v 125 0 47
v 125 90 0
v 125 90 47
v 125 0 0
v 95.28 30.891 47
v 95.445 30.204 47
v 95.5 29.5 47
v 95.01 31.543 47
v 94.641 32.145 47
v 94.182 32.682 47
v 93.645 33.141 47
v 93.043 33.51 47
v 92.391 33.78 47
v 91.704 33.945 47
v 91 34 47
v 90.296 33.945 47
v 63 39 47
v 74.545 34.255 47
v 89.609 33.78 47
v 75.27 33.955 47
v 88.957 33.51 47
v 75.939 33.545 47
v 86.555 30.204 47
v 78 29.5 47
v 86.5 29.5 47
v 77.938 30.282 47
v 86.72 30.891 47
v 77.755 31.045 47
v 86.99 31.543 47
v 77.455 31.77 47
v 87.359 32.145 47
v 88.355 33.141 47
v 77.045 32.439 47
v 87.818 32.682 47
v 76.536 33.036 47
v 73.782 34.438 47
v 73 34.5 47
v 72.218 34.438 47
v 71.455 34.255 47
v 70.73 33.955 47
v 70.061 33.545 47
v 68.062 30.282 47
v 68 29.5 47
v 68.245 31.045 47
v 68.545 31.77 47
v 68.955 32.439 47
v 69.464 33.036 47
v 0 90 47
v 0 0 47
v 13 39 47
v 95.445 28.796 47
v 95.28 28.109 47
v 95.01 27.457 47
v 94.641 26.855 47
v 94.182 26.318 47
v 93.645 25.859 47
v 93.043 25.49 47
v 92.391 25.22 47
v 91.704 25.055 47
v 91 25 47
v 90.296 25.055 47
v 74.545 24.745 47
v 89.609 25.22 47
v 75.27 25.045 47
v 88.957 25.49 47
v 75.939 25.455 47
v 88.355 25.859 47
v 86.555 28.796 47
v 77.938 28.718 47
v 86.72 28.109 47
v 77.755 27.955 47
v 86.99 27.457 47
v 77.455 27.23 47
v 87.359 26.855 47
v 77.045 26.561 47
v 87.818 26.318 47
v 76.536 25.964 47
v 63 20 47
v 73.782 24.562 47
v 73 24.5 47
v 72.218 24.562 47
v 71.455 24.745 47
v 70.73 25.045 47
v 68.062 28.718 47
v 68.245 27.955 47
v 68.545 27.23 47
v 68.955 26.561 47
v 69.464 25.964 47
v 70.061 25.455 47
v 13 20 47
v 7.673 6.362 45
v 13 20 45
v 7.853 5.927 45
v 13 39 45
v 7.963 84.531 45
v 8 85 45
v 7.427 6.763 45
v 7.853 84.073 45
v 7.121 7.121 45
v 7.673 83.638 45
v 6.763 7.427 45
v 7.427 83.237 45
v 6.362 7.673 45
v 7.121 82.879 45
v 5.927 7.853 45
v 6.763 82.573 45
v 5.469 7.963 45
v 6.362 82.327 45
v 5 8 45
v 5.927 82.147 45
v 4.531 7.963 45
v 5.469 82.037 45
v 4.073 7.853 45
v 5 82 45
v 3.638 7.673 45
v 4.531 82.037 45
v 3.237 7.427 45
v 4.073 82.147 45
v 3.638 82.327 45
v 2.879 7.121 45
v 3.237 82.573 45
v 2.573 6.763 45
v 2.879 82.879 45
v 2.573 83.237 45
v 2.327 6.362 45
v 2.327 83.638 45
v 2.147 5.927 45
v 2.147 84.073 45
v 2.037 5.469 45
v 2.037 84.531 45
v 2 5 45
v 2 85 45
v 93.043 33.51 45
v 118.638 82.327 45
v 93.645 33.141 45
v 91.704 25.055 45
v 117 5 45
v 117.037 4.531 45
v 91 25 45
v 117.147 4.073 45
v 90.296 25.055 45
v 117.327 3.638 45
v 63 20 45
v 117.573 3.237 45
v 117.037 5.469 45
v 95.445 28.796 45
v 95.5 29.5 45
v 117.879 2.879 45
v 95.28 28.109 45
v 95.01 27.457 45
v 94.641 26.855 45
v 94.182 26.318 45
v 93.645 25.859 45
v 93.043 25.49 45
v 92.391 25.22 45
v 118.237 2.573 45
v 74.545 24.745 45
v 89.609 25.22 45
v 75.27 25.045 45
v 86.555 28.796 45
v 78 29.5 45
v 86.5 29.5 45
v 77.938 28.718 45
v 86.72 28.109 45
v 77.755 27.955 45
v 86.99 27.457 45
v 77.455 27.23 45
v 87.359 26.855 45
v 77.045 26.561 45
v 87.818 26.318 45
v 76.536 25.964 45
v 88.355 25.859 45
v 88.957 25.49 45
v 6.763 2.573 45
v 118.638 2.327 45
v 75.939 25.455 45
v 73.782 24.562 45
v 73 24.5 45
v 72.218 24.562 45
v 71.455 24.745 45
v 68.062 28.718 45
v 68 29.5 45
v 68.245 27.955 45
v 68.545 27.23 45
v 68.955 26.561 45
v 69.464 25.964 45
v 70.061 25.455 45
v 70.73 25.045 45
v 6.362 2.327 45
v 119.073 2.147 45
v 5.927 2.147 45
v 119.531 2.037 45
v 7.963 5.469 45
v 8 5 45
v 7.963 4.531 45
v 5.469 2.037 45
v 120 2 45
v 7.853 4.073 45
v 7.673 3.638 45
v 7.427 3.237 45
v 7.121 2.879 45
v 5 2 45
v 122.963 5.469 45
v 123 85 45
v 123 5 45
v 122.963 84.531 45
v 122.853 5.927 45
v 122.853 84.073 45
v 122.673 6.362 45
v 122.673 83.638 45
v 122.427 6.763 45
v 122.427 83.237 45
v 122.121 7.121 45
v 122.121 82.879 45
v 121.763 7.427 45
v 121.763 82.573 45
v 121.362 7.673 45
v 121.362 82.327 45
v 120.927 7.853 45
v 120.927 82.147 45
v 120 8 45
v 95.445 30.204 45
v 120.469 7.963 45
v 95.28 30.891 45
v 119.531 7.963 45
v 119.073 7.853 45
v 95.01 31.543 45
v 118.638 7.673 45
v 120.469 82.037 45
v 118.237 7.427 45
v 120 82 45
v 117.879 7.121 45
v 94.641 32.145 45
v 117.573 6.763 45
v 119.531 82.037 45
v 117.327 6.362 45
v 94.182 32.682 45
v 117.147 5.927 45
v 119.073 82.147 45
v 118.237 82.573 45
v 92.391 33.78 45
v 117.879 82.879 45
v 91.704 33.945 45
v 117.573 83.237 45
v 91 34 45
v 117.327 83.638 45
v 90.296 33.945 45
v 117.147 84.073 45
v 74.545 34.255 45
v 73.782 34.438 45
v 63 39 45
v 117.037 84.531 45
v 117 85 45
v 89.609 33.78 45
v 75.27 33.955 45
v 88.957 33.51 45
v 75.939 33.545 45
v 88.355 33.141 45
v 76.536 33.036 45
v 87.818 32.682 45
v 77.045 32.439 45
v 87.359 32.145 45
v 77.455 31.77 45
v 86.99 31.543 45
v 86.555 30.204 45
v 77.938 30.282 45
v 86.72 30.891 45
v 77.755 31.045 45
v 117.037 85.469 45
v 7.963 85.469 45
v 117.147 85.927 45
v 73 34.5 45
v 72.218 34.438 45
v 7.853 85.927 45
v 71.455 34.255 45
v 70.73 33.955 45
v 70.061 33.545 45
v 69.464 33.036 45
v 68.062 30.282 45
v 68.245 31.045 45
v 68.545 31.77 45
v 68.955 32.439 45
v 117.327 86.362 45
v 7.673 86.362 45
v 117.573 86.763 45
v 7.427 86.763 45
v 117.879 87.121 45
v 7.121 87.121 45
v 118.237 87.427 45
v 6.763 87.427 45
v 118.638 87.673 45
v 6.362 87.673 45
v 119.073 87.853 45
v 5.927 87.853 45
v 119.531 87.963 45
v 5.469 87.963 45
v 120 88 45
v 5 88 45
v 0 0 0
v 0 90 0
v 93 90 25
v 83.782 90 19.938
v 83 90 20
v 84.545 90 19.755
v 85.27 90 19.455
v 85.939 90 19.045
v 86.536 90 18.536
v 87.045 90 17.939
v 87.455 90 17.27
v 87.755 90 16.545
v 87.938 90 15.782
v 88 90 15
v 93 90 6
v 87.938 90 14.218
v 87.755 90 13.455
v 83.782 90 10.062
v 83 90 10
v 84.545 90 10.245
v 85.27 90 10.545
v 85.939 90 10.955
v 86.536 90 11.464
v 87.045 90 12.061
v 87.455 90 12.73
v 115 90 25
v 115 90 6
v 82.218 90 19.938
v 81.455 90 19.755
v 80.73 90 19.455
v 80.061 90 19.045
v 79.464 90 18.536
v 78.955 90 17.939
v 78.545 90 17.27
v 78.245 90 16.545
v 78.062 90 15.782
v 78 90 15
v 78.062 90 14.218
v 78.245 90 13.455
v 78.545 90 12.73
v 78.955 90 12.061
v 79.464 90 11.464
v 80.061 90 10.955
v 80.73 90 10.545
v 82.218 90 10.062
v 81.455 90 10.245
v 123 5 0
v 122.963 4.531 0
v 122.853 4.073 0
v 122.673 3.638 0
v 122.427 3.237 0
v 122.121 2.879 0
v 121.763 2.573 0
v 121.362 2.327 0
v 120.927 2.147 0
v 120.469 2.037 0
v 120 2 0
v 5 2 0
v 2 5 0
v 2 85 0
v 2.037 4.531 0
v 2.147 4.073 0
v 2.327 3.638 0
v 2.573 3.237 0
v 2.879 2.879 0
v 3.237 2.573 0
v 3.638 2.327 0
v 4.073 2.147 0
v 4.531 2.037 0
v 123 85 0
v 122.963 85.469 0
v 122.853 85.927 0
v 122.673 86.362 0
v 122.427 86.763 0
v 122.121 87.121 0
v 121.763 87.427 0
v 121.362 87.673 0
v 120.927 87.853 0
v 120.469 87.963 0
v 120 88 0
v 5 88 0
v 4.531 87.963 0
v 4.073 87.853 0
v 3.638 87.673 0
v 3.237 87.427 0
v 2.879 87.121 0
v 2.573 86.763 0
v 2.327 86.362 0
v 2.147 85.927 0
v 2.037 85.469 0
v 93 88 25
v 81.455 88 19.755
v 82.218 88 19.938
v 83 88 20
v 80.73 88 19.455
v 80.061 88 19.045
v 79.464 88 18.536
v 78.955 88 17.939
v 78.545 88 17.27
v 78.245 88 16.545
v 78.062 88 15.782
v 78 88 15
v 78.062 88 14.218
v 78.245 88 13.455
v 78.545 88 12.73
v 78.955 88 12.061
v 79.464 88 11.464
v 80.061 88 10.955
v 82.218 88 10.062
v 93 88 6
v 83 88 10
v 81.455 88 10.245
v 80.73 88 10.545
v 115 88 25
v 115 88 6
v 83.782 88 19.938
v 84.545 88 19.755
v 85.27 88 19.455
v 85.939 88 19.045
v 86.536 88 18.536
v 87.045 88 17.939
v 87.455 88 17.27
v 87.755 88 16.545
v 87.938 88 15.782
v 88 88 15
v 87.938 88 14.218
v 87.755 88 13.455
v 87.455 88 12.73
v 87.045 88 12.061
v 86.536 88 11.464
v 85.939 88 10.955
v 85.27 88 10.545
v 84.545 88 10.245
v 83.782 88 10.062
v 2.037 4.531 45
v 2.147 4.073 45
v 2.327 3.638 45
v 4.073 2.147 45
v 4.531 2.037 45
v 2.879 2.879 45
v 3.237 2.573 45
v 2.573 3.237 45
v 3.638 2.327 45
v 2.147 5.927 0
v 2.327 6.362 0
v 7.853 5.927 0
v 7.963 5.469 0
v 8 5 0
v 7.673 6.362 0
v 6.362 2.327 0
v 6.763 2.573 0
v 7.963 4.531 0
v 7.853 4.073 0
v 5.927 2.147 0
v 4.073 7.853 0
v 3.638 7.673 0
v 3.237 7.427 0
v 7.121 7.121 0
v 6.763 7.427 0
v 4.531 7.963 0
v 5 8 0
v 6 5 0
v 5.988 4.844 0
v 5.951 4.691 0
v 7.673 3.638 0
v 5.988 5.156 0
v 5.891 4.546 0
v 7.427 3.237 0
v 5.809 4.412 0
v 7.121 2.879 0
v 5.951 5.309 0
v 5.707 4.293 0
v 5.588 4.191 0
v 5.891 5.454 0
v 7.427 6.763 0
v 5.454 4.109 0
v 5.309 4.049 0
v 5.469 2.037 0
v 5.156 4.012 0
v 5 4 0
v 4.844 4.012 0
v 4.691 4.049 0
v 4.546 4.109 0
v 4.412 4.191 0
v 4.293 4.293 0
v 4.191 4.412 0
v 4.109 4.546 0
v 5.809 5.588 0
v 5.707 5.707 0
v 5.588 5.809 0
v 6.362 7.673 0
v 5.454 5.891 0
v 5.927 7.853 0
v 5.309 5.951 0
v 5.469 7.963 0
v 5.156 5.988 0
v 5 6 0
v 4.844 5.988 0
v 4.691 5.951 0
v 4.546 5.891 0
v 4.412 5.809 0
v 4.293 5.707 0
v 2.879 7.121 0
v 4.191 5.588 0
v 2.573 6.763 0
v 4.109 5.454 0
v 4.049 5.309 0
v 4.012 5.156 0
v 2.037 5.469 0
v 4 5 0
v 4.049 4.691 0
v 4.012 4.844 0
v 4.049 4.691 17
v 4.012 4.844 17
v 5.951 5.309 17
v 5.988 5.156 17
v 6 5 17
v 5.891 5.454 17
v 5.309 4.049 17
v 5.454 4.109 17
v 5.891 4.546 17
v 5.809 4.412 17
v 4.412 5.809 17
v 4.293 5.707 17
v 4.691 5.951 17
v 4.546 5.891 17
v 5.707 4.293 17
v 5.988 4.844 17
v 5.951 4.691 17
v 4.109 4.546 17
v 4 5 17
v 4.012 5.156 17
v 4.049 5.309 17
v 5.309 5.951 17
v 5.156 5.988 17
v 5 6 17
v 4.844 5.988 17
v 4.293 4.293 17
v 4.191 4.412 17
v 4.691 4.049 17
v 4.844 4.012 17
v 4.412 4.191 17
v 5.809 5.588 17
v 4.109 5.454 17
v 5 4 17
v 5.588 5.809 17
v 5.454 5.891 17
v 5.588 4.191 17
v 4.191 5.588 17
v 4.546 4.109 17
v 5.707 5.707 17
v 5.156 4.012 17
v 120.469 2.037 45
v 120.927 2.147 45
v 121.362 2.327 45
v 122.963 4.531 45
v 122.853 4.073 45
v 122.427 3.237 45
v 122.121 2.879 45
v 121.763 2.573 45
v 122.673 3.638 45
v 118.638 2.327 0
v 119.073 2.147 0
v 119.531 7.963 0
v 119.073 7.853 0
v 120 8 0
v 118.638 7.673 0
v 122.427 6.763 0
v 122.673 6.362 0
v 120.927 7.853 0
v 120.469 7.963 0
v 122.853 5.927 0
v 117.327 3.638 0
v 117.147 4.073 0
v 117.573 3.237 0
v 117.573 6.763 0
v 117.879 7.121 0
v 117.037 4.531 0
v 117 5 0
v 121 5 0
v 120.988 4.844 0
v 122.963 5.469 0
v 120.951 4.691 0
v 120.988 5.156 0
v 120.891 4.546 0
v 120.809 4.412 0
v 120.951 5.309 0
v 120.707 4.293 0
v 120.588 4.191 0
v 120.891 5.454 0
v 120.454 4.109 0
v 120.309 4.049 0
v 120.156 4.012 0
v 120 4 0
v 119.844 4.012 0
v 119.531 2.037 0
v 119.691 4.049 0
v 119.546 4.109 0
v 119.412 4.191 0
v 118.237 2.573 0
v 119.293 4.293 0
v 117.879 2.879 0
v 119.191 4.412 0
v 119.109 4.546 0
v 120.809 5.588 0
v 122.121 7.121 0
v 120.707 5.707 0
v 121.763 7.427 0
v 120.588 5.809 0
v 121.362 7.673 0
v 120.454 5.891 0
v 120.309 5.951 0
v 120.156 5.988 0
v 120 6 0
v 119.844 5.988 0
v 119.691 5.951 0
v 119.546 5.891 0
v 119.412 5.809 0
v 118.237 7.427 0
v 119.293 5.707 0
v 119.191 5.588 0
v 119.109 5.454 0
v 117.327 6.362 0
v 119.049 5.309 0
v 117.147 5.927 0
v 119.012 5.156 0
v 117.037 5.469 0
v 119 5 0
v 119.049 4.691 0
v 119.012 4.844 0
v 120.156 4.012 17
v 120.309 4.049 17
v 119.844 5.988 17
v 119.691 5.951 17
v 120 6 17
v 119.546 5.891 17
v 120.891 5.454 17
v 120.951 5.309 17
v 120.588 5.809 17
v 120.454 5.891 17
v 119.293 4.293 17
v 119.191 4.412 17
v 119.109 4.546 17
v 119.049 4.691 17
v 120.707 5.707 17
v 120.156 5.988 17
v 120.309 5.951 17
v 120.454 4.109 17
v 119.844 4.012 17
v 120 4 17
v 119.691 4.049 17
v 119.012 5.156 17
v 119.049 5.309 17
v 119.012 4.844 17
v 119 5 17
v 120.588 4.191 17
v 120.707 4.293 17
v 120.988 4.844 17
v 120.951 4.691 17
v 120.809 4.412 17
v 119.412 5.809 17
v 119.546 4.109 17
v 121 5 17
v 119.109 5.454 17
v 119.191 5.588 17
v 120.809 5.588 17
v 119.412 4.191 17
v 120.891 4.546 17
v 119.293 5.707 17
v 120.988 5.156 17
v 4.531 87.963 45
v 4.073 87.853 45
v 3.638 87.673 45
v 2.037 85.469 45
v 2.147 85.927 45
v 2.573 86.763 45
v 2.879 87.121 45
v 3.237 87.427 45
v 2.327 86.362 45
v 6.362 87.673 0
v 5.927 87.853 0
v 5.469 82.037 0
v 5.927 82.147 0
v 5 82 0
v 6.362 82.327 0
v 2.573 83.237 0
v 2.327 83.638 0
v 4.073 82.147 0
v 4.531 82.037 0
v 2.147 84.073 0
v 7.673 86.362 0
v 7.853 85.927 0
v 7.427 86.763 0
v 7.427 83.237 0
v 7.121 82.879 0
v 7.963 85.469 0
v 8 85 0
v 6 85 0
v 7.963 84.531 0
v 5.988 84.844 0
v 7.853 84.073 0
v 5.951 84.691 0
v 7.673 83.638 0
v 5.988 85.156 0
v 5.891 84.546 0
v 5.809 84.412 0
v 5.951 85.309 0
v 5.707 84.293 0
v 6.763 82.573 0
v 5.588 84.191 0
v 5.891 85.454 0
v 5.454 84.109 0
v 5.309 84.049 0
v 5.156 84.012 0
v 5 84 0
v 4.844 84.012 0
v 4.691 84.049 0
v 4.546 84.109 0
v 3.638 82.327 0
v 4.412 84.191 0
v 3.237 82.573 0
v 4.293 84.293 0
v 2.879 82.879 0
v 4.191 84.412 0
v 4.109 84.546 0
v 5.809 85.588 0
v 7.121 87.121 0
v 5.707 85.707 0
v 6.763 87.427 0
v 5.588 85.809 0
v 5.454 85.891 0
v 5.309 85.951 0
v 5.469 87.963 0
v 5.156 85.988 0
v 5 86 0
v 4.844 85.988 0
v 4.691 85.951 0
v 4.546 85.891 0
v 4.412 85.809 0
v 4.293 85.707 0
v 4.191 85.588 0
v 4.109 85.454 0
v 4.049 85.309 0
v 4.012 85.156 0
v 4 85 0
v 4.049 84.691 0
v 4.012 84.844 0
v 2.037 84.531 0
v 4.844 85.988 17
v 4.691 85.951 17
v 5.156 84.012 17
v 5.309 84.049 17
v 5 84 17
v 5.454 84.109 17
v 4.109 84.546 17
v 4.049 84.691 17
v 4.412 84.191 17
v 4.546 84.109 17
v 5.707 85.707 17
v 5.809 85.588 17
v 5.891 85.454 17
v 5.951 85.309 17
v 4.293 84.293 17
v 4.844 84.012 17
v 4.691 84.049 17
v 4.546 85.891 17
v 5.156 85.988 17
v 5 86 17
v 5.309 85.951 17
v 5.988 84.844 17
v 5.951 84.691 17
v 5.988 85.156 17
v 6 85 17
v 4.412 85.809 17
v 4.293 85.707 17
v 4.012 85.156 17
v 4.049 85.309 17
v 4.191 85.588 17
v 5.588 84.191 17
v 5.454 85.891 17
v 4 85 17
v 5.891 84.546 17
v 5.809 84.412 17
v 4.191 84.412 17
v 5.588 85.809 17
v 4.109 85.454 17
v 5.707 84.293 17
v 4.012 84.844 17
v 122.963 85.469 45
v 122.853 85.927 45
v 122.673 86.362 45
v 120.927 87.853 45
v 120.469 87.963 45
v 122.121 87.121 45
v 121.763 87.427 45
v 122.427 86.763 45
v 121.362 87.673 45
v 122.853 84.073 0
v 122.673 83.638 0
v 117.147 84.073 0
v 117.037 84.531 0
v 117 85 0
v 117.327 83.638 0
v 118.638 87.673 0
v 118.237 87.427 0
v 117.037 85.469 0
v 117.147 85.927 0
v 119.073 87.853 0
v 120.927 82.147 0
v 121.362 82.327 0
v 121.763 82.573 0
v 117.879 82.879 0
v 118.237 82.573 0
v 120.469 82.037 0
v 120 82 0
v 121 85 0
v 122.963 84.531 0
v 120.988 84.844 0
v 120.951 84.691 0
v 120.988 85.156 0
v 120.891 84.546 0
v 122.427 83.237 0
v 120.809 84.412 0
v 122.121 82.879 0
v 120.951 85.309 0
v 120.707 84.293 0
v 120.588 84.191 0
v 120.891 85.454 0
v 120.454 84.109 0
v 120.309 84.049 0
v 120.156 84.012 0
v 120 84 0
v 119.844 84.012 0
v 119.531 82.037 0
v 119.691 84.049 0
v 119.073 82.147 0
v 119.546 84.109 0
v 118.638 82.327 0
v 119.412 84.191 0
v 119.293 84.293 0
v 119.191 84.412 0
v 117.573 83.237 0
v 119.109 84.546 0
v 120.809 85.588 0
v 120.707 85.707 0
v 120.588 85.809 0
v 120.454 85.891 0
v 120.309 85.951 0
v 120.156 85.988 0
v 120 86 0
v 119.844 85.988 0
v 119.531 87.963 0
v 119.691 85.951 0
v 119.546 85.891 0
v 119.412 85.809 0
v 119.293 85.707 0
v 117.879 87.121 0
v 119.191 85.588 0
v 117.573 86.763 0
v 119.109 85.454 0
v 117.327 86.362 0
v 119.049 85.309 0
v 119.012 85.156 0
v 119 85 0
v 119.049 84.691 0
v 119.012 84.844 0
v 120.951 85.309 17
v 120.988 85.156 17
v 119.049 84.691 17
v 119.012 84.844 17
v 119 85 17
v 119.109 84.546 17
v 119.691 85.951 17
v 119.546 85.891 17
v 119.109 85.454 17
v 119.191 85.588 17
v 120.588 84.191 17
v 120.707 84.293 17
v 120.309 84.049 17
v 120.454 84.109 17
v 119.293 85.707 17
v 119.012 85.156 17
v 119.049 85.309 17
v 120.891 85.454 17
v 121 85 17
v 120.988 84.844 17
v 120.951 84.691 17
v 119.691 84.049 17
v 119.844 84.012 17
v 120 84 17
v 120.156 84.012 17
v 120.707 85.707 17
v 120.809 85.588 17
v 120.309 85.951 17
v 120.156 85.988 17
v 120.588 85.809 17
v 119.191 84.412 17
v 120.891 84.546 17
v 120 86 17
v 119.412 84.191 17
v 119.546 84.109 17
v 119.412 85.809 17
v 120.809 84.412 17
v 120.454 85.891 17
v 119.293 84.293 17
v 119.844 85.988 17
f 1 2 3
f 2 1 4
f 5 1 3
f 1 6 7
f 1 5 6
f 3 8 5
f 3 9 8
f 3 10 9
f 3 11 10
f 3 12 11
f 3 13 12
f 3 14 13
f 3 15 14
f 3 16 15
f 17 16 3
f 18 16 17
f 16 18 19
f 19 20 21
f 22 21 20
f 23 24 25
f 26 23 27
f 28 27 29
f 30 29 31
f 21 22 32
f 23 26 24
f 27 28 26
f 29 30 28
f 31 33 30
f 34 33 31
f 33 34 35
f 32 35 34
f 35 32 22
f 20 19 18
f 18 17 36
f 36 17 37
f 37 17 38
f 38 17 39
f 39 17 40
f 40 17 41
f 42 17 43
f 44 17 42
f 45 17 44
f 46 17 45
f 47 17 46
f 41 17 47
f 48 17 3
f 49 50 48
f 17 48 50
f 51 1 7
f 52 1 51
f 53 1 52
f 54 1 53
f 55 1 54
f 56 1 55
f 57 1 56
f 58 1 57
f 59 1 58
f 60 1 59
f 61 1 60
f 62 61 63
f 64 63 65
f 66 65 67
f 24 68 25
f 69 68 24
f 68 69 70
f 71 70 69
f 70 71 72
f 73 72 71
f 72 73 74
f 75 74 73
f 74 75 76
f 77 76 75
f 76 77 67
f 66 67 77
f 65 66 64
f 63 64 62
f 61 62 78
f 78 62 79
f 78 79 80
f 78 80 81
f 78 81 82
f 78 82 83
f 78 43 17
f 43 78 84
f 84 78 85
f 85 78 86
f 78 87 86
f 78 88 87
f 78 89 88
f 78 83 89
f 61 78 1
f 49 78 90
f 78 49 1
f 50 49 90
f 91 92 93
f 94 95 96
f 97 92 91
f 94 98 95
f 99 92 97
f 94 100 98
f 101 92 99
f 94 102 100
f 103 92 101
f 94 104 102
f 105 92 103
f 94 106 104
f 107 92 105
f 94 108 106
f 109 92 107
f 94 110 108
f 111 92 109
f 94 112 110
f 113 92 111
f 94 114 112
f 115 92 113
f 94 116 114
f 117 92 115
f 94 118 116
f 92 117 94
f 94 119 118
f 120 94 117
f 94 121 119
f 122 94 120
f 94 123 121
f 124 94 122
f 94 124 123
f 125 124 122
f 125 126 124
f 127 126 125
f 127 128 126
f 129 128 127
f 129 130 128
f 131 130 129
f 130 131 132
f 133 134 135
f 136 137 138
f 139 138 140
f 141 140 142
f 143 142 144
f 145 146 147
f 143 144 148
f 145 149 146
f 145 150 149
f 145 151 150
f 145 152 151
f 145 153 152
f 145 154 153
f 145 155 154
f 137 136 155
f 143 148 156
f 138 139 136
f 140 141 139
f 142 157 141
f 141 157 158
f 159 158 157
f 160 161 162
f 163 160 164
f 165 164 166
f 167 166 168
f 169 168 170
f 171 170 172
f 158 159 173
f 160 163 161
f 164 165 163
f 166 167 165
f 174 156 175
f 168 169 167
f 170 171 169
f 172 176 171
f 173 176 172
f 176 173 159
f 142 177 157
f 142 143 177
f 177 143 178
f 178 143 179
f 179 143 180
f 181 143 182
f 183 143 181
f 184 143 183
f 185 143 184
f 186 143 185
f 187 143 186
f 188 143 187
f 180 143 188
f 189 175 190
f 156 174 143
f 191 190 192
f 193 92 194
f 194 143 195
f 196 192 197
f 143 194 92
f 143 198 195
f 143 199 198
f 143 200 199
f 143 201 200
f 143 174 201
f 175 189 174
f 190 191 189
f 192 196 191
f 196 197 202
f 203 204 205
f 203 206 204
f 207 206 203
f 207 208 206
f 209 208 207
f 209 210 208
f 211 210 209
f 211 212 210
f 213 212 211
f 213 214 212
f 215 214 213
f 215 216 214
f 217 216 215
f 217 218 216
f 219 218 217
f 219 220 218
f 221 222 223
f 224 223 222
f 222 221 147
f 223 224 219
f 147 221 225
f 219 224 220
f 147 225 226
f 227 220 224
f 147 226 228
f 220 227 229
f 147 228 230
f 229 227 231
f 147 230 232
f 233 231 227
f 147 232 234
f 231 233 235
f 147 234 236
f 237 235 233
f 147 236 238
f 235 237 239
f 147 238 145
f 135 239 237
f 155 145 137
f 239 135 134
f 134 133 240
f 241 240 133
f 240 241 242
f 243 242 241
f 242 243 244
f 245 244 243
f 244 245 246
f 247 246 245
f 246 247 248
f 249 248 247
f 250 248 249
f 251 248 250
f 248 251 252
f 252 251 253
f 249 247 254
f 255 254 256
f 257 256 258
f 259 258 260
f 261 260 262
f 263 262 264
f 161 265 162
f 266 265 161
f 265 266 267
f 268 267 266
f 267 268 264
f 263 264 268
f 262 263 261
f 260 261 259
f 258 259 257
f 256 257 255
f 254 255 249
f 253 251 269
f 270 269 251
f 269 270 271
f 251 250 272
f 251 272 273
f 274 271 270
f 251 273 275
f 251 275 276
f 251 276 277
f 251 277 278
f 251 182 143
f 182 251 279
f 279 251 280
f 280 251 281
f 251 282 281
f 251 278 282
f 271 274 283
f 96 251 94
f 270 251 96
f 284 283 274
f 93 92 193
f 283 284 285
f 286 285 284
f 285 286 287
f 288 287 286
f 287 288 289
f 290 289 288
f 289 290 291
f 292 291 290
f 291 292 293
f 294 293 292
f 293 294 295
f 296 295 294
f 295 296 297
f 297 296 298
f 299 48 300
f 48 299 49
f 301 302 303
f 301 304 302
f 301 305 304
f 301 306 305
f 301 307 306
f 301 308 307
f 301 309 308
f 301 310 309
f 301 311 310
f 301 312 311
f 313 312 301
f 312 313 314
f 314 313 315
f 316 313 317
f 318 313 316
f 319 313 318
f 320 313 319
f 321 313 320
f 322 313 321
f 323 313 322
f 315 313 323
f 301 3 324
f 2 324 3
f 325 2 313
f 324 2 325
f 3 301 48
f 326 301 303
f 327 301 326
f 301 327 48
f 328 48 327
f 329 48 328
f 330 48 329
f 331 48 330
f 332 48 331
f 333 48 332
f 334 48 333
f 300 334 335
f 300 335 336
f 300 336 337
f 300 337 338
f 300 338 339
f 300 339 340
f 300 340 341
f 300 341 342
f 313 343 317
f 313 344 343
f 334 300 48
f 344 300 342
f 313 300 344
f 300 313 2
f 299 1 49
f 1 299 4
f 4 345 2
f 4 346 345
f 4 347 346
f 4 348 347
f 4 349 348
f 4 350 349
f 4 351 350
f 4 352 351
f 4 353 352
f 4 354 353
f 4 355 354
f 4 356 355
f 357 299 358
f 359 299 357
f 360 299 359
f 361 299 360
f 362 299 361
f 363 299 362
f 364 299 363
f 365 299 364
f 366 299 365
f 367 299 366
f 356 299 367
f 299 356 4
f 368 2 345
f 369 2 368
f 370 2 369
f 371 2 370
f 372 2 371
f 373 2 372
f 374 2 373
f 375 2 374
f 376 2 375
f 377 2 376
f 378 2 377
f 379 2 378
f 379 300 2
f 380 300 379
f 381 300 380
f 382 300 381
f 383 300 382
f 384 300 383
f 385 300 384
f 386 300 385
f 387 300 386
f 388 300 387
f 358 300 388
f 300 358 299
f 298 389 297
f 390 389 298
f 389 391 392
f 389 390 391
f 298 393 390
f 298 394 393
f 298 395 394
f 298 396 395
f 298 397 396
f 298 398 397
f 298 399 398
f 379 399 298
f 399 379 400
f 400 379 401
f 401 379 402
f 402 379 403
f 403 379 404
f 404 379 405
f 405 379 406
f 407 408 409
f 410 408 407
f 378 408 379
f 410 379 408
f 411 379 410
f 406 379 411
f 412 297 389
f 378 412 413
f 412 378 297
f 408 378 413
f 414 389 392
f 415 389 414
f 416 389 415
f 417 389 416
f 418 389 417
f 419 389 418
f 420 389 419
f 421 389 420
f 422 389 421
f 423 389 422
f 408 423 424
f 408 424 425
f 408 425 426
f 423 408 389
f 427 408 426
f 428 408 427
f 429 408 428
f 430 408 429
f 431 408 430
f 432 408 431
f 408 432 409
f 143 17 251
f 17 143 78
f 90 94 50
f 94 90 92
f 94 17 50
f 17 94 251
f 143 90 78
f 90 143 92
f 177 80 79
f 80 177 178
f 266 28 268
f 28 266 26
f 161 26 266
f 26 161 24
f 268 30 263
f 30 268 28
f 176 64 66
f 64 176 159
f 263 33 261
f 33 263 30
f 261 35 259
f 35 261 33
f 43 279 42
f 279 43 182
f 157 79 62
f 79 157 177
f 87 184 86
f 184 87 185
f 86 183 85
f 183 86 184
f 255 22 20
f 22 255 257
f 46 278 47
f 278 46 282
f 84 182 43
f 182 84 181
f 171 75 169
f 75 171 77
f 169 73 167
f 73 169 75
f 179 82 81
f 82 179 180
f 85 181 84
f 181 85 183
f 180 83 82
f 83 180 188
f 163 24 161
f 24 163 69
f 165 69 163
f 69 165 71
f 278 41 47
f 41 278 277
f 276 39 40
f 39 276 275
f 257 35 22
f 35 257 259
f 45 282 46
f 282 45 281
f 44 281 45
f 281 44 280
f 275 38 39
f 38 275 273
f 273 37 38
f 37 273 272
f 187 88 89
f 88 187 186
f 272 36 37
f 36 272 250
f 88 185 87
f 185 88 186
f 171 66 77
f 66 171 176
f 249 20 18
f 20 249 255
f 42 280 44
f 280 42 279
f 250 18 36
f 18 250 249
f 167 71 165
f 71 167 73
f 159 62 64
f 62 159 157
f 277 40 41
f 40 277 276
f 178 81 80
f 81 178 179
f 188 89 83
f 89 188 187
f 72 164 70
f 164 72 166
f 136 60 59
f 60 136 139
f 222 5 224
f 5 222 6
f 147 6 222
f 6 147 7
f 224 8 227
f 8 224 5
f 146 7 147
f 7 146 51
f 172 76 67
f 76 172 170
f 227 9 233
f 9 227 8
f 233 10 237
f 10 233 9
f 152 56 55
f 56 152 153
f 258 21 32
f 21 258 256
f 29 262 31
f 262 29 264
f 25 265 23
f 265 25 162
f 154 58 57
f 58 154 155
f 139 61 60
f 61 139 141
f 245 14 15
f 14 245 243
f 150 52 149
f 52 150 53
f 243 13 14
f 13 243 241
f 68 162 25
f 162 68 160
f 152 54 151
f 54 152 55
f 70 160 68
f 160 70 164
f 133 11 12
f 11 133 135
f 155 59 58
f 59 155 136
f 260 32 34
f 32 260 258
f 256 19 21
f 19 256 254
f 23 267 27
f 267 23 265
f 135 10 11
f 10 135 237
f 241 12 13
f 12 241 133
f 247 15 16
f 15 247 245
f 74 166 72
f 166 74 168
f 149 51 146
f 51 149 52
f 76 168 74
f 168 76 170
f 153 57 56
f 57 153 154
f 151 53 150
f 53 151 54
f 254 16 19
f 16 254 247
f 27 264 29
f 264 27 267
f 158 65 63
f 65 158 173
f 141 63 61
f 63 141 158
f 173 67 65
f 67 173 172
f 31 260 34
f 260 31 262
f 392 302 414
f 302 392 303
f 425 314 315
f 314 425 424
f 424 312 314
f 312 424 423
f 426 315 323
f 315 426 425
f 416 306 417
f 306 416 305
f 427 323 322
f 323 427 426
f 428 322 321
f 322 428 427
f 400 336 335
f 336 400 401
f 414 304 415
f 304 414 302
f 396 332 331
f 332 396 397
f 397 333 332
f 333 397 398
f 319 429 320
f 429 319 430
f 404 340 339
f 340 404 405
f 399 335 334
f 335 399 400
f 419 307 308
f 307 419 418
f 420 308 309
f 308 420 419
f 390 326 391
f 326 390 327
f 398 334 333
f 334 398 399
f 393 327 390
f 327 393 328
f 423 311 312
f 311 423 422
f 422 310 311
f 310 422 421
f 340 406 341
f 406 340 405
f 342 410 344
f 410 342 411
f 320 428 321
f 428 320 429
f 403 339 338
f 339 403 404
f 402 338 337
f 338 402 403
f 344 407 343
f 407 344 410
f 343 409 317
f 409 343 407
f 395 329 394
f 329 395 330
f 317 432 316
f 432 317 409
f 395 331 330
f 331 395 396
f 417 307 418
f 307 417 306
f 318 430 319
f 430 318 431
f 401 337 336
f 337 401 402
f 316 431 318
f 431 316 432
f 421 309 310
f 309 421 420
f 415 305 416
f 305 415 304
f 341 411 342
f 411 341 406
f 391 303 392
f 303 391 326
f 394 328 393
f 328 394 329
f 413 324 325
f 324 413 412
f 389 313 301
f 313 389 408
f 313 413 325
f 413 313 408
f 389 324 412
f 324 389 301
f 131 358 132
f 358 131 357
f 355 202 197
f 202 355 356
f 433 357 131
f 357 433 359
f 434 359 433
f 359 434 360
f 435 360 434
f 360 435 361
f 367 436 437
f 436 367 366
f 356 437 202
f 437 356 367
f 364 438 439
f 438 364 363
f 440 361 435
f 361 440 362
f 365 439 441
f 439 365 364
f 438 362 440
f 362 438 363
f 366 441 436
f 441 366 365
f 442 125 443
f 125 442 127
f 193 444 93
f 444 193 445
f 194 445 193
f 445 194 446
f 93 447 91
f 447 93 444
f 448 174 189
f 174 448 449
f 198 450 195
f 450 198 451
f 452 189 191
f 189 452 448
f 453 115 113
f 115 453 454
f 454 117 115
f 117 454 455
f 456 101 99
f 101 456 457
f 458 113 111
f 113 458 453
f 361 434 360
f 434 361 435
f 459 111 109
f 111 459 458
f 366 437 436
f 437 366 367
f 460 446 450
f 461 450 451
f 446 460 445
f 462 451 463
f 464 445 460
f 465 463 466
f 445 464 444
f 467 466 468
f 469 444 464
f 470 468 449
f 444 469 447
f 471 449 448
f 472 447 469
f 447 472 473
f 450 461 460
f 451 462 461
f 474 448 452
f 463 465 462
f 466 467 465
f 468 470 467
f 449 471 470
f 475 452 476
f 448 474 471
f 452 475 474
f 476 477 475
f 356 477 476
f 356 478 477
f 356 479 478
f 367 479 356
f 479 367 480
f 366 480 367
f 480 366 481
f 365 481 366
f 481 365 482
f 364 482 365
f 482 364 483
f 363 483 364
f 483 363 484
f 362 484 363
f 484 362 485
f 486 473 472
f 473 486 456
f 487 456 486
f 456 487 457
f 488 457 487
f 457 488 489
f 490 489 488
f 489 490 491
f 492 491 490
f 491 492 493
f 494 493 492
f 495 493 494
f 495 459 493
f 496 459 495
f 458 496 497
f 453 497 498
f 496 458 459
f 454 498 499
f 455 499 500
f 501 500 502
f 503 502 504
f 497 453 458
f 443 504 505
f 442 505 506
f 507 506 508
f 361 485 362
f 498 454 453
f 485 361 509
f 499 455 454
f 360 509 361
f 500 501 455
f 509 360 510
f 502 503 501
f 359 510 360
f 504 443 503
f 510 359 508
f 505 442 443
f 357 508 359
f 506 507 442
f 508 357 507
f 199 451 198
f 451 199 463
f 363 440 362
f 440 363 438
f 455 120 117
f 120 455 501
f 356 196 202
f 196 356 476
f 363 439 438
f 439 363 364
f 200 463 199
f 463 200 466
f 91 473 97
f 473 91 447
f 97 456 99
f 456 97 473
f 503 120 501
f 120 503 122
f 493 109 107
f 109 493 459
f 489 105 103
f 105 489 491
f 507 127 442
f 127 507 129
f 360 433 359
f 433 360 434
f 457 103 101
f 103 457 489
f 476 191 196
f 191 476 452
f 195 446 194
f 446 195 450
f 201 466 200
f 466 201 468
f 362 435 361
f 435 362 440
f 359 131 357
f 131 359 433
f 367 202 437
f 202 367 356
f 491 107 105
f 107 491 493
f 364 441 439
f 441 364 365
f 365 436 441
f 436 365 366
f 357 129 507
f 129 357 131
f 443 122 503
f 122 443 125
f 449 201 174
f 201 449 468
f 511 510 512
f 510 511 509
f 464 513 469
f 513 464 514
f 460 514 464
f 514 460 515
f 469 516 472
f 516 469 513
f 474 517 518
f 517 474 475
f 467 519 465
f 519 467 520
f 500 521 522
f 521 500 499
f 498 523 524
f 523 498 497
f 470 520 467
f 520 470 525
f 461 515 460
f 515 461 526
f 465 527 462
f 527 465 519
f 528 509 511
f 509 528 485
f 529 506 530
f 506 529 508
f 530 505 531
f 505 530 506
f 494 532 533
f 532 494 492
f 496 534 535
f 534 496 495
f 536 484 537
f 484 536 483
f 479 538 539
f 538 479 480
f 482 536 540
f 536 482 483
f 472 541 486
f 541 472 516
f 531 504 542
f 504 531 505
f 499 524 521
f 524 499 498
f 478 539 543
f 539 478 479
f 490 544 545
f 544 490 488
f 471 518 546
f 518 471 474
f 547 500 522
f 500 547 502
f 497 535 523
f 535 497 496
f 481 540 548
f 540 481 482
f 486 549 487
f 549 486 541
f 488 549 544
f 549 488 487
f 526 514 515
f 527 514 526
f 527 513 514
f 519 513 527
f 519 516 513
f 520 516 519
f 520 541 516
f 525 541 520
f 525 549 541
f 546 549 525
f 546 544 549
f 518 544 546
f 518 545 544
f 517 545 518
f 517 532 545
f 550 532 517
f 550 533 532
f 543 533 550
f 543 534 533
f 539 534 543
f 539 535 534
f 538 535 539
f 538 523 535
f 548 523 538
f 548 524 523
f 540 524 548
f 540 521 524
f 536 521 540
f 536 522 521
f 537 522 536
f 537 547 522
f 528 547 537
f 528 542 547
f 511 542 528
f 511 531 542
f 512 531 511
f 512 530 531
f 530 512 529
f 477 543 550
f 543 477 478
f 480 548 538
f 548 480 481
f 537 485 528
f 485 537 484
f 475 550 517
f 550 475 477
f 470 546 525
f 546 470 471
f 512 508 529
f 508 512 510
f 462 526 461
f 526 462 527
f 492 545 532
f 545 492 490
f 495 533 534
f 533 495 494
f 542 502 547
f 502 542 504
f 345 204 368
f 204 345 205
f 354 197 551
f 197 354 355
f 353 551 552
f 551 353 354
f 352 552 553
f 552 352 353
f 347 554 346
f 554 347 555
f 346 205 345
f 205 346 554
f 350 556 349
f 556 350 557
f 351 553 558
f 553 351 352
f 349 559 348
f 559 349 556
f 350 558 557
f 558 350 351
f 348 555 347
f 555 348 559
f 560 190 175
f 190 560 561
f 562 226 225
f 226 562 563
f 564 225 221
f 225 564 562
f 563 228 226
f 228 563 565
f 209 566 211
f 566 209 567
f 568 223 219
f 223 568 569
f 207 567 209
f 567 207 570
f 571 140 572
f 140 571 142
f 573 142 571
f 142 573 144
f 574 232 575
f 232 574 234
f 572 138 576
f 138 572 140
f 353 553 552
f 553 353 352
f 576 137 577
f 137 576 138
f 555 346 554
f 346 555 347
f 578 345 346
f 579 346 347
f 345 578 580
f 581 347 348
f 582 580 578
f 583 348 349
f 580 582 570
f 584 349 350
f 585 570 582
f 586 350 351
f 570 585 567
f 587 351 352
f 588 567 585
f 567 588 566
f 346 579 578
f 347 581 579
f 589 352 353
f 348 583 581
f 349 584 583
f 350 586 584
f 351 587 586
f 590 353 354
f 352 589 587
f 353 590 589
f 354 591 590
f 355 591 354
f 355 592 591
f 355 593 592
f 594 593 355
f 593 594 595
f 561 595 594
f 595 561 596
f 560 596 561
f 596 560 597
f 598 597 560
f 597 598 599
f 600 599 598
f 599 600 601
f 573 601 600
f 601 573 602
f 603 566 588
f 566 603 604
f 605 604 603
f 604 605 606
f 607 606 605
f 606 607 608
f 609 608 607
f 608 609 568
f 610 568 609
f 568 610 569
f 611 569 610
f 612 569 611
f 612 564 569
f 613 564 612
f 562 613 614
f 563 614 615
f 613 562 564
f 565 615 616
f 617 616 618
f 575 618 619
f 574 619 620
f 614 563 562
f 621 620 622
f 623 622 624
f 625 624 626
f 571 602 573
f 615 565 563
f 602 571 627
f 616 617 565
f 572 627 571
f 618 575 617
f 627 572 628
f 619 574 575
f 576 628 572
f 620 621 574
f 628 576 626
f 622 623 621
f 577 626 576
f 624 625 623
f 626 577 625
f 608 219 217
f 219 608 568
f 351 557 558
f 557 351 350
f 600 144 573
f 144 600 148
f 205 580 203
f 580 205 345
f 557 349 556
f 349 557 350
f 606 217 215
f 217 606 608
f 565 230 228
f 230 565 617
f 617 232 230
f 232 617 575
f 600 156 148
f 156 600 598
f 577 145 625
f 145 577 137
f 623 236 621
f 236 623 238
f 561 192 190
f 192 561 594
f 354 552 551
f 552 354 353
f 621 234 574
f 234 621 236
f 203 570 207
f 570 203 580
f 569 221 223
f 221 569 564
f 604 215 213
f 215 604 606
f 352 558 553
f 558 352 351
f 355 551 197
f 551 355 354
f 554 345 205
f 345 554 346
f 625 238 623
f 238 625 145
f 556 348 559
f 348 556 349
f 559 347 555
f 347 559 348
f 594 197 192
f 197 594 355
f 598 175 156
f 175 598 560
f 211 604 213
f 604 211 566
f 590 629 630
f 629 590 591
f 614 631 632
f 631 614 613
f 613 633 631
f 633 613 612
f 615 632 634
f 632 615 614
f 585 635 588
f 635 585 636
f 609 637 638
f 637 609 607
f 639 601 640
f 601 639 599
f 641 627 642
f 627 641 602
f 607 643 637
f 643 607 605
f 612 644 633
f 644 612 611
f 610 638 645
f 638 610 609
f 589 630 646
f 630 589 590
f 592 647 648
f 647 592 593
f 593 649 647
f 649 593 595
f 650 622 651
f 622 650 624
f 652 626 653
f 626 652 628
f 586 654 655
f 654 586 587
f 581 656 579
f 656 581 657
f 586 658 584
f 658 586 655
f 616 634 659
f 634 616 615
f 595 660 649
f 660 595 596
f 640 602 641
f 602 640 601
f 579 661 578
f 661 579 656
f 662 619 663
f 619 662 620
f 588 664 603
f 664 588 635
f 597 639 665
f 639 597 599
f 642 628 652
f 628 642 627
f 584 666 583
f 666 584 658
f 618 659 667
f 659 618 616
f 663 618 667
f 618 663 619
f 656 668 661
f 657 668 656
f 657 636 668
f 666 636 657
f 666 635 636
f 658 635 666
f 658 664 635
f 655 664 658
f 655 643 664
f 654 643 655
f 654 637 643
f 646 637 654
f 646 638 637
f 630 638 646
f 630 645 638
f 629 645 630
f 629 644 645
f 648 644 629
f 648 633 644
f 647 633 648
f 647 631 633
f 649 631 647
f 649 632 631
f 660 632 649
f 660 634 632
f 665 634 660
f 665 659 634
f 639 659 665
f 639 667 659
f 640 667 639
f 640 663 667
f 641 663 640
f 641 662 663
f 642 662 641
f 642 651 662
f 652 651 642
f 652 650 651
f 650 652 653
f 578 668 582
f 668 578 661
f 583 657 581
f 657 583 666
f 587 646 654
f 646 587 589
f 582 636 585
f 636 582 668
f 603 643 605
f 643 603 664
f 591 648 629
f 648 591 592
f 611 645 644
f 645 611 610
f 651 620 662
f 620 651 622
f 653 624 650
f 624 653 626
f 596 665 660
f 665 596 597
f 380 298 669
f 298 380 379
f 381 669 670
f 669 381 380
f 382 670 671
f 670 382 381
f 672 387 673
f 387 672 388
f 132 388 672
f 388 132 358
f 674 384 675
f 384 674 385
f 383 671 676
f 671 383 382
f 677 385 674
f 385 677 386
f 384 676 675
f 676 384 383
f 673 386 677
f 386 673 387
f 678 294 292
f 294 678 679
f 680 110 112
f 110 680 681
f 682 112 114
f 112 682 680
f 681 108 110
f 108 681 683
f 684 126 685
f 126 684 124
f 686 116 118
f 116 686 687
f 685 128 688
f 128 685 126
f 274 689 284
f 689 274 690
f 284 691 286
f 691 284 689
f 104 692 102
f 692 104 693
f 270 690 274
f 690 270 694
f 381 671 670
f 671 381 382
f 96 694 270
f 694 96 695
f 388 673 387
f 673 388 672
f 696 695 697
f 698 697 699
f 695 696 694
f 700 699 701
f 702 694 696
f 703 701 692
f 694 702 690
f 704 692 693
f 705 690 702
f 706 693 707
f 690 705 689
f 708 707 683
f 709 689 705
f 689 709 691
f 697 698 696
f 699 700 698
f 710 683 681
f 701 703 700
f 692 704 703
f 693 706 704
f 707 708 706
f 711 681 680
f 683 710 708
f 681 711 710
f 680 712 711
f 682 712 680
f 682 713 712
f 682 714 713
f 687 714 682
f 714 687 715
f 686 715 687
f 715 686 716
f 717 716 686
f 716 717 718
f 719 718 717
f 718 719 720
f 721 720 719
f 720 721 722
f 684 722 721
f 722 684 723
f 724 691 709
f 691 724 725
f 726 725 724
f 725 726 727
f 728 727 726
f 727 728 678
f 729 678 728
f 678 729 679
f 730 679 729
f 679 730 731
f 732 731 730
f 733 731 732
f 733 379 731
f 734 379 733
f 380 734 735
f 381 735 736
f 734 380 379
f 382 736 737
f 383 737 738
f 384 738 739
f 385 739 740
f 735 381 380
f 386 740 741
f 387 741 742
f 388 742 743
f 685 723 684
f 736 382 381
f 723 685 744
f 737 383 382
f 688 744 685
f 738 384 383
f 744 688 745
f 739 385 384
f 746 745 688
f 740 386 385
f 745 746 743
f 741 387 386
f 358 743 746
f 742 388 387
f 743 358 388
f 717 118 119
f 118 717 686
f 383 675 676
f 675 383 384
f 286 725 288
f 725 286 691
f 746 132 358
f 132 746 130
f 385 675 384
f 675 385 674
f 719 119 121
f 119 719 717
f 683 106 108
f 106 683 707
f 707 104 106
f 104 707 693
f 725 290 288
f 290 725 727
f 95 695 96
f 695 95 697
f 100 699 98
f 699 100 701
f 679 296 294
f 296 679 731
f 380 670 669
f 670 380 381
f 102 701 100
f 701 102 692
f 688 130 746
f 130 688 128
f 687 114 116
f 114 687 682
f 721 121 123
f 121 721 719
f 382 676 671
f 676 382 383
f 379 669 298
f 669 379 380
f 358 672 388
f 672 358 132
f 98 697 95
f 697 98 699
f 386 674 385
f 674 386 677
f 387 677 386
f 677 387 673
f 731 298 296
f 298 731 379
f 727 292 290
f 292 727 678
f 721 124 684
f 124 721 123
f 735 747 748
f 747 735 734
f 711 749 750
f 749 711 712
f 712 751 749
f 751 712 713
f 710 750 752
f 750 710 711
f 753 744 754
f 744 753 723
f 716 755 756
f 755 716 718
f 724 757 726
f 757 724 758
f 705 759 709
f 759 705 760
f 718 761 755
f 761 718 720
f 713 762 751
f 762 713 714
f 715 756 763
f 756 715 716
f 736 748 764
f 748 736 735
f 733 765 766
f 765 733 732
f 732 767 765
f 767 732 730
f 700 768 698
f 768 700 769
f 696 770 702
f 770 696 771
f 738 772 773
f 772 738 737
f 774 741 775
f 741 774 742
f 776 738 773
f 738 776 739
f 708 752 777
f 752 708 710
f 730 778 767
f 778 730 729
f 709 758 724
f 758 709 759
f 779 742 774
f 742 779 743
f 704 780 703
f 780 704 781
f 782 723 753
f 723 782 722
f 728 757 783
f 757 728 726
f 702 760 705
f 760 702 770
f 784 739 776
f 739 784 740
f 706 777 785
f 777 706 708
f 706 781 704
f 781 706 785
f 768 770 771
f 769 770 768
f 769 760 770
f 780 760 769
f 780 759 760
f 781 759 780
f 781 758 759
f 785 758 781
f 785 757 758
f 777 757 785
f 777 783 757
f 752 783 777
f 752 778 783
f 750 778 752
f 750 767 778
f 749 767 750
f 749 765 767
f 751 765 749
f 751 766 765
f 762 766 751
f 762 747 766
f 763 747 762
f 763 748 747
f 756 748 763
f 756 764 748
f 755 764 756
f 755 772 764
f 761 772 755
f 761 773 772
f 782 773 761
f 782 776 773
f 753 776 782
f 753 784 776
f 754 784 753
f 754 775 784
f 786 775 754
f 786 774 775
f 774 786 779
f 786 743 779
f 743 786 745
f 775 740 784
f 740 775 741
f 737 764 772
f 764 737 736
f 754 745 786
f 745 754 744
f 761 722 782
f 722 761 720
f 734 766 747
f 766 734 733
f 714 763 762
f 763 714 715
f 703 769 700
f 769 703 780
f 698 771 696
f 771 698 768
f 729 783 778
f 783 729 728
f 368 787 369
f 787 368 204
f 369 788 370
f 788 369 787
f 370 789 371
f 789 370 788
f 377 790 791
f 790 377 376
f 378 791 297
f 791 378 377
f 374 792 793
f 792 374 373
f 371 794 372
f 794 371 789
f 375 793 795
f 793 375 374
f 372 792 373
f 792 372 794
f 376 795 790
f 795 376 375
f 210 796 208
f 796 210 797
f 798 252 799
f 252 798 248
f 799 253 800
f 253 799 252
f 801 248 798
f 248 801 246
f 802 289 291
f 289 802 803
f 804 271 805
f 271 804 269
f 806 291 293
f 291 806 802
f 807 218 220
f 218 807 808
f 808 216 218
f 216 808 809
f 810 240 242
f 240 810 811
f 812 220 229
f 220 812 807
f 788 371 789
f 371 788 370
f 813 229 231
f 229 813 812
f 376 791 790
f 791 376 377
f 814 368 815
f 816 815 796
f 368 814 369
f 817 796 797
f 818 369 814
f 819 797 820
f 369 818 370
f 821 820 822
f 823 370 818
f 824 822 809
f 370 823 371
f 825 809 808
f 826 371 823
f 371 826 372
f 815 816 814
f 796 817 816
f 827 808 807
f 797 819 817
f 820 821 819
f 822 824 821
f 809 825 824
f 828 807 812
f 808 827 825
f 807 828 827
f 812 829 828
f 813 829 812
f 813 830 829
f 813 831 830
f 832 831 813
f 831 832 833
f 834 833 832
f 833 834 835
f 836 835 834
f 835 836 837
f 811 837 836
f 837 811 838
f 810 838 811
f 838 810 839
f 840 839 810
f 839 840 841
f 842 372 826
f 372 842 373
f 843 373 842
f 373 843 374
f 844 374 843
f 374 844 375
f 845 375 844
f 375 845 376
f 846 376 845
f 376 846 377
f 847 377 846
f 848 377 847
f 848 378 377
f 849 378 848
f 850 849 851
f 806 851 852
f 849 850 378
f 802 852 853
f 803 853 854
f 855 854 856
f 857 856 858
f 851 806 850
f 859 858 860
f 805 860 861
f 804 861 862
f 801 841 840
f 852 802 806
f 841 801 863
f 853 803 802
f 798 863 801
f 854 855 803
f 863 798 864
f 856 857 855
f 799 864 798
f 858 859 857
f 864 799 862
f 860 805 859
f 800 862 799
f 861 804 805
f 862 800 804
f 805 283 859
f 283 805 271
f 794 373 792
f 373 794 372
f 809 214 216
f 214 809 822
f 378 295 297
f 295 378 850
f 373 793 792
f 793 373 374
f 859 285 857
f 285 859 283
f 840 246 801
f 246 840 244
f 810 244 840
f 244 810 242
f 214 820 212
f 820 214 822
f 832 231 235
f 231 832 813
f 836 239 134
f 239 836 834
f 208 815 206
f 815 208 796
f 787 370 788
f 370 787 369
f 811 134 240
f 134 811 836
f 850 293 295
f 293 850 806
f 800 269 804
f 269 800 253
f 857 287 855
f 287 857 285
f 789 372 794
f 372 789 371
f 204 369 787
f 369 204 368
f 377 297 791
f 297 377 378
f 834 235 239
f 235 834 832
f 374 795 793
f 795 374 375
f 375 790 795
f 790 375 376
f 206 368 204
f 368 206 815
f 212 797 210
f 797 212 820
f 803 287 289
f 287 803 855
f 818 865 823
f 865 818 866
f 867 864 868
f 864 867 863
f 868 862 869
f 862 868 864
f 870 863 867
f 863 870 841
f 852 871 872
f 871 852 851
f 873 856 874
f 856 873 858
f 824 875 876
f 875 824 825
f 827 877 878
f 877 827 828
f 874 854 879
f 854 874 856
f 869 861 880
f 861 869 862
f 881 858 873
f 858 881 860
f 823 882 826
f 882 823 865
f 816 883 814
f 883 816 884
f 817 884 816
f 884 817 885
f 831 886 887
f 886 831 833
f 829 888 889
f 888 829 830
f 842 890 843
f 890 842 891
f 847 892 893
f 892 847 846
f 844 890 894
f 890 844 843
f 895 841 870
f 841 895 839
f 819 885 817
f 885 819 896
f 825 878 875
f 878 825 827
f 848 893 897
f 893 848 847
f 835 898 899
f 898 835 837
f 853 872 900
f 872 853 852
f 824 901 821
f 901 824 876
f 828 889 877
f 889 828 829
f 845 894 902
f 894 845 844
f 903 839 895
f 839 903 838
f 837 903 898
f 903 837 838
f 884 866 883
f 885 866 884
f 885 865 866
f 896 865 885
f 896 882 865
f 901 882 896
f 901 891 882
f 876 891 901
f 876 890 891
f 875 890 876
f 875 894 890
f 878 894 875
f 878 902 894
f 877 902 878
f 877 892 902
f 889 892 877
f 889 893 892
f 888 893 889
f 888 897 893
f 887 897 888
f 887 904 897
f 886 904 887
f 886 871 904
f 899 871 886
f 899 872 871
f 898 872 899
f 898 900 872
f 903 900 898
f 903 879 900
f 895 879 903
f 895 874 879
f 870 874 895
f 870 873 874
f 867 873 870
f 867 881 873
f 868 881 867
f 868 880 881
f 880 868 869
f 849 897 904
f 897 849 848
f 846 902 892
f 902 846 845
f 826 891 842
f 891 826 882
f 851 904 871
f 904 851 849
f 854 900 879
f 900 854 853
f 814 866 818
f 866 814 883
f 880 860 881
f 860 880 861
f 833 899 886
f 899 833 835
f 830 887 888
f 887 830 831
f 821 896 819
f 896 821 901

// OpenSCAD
// file: appliances.scad
module breadboard() {
    rotate([0,0,90]) color([1,1,1]) difference() {
        cube([50, 43, 5]);
    
        translate([25, 3/2+2, -5]) cylinder(r=3, h=3*5);
    }
}

module arduinopromini() {
    rotate([0,0,90]) color([.2,.15,.80]) cube([33, 17, 4]);
    
    translate([0,0,4]) rotate([0,0,90]) union() {
        for(offset=[0:2.54:30]) {
            translate([offset, 0, 0]) color([.2,.2,.2]) cube(2.44);
            translate([offset+1.17,1.17,2.54+2.5]) color([.7,.7,.7]) cube([1,1,5], center=true);
        }
    }
    
    translate([-17+2.44,0,4]) rotate([0,0,90]) union() {
        for(offset=[0:2.54:30]) {
            translate([offset, 0, 0]) color([.2,.2,.2]) cube(2.44);
            translate([offset+1.17,1.17,2.54+2.5]) color([.7,.7,.7]) cube([1,1,5], center=true);
        }
    }
    
    translate([-17+1,33-2.44,4]) rotate([0,0,0]) union() {
        for(offset=[0:2.54:13]) {
            translate([offset, 0, 0]) color([.2,.2,.2]) cube(2.44);
            translate([offset+1.17,1.17,2.54+0.5]) color([.7,.7,.7]) cube([1,1,1], center=true);
            translate([offset+1.17,1.17+3,2.54+1.5]) rotate([90,0,0]) color([.7,.7,.7]) cube([1,1,7], center=true);
        }
    }
}

module 7segmentdisplay() {
    color([1,1,1]) cube([50, 19, 7]);
    translate([0,0,7]) color([0,0,0]) cube([50, 19, 1]);
    
    for(offset=[0:12.6:40]) {
        translate([offset+4,3,8]) color([0.8,0.8,0.8]) cube([4, 0.8, 0.1]);
        translate([offset+4,9,8]) color([0.8,0.8,0.8]) cube([4, 0.8, 0.1]);
        translate([offset+4,15.4,8]) color([0.8,0.8,0.8]) cube([4, 0.8, 0.1]);
    
        translate([offset+3,3,8]) color([0.8,0.8,0.8]) cube([0.8, 6.5, 0.1]);
        translate([offset+3,9.7,8]) color([0.8,0.8,0.8]) cube([0.8, 6.5, 0.1]);
        translate([offset+8.2,3,8]) color([0.8,0.8,0.8]) cube([0.8, 6.5, 0.1]);
        translate([offset+8.2,9.7,8]) color([0.8,0.8,0.8]) cube([0.8, 6.5, 0.1]);
    }
    
    color([0.7,0.7,0.7]) union() {
        for(offset=[17:3:32]) {
            translate([offset, 1, -8]) cube([1,1,15]);
        }
        
        for(offset=[17:3:32]) {
            translate([offset, 17, -8]) cube([1,1,15]);
        }
    }
}

module button() {
    $fn = 40;
    color([0.2,0.2,0.2]) cylinder(r=4.5, h=14);
    
    color([0.7,0.7,0.7]) union() {
        translate([2, -0.75, -5]) cube([0.5, 1.5, 5]);
        translate([-2, -0.75, -5]) cube([0.5, 1.5, 5]);
    }
    
    color([0.2,0.2,0.2]) translate([0,0,14]) cylinder(r1=7.5, r2=6, h=7);
    color([0.8,0.8,0.8]) translate([0,0,21]) cylinder(r=5, h=4);
}

module led(color) {
    $fn = 40;
    
    color(color) union() {
        translate([0,0,1]) cylinder(r=5, h=6);
        translate([0,0,7]) sphere(r=5);
        cylinder(r=6, h=1);
    }
    
    color([0.7,0.7,0.7]) union() {
        translate([-3,-0.5,-30]) cube([1,1,30]);
        translate([2,-0.5,-30]) cube([1,1,30]);
    }
}

module switch() {
    color([0.2,0.2,0.2]) union() {
        cube([22, 19, 12]);
    
        translate([-1,-1,12]) cube([24,21,2]); // top border
    
        translate([-2,0,-3]) rotate([0,6,0]) difference() {
            translate([1,1,17]) cube([20,17,3]); // finger pressing plate
            translate([11,20,58]) rotate([90,0,0]) cylinder(r=40, h=20);
        }
        
        translate([10.5,0,-7]) cube([1,19,7]); // bottom divider wall
    }
    
    // solder connections
    translate([4,3,-7]) rotate([0,0,-45]) color([0.7,0.7,0.7]) cube([4,0.5,7]);
    translate([4,9,-7]) rotate([0,0,-45]) color([0.7,0.7,0.7]) cube([4,0.5,7]);
    translate([15,3,-7]) rotate([0,0,-45]) color([0.7,0.7,0.7]) cube([4,0.5,7]);
    translate([15,9,-7]) rotate([0,0,-45]) color([0.7,0.7,0.7]) cube([4,0.5,7]);
}

module v9battery() {
    color([1,0,0]) cube([26,17,46]);
}


translate([100,0,0]) switch();
translate([135,0,0]) led([1,1,0]);
translate([150,0,0]) 7segmentdisplay();
translate([220,0,0]) button();
arduinopromini();
// main file
use <appliances.scad>;

module positioned_green_led() {
    translate([35,81.5,15]) rotate([-90,0,0]) led([0,1,0]);
}

module positioned_switch() {
    translate([45,73.5,25]) rotate([-90,0,0]) switch();
}

module positioned_yellow_led() {
    translate([25,24.5,42.5]) led([1,1,0]);
}

module positioned_button() {
    translate([43,24.5,33.5]) button();
}

module positioned_display() {
    translate([-35,15,40.5]) 7segmentdisplay();
}

// appliances
module appliances() {
    translate([48,5,0]) union() {
        translate([5,0,0]) breadboard();
        translate([47,0,0]) arduinopromini();
        translate([55,50,28]) rotate([90,90,0]) v9battery();

        positioned_display();
        positioned_yellow_led();
        positioned_button();

        positioned_green_led();
        positioned_switch();
    }
}

// case
width = 125;
depth = 90;
height = 45;

// Top Case
module topCase() {
    union() {
        cube([2, depth, height]); // left
        cube([width, 2, height]); // front
        
        difference() {
            union() {
                translate([0, 0, height]) cube([width, depth, 2]); // top
                translate([0, depth-2, 0]) cube([width, 2, height]); // back
            }
            
            translate([48,5,0]) union() {
                positioned_display();
                positioned_yellow_led();
                positioned_button();
                
                positioned_green_led();
                positioned_switch();
            }
        }

        translate([width-2, 0, 0]) cube([2, depth, height]); // right
        
        // screws: 3x16
        translate([2,2,0]) mountingHoleCorner(); // front left
        translate([width-2,2,0]) rotate([0,0,90]) mountingHoleCorner(); // front right
        translate([2,depth-2,0]) rotate([0,0,270]) mountingHoleCorner(); // back left
        translate([width-2,depth-2,0]) rotate([0,0,180]) mountingHoleCorner(); // back right
    }
}


// Bottom Case
module bottomCase() {
    color([1,0,0,1]) union() {
        $fn = 40;
        
        difference() {
            translate([0, 0, -2]) cube([width, depth, 2]); // bottom
            
            // front left
            translate([5,5,-4]) cylinder(r=1.5, h=6);
            translate([5,5,-2.1]) cylinder(r2=1.5, r1=3, h=1.1);
            
            // front right
            translate([width-5,5,-4]) cylinder(r=1.5, h=6);
            translate([width-5,5,-2.1]) cylinder(r2=1.5, r1=3, h=1.1);
            
            // back left
            translate([5,depth-5,-4]) cylinder(r=1.5, h=6);
            translate([5,depth-5,-2.1]) cylinder(r2=1.5, r1=3, h=1.1);
            
            // back right
            translate([width-5,depth-5,-4]) cylinder(r=1.5, h=6);
            translate([width-5,depth-5,-2.1]) cylinder(r2=1.5, r1=3, h=1.1);
        }
        translate([99, 2, 0]) cube([2, 50, height-2]); // battery divider
        translate([65, 2, 0]) cube([2, 50, height/2-2]); // arduino divider
    }
}

module mountingHoleCorner() {
    $fn = 40;
    
    difference() {
        cube([3, 3, height]);
        
        translate([3,3,-1]) cylinder(r=3, h=height+2);
    }
    
    translate([3,3,0]) mountingHole(height);
}
    
module mountingHole(height) {
    difference() {
        cylinder(r=3, h=height);
            
        translate([0,0,-1]) cylinder(r=1, h=18);
    }
}

//appliances();
topCase();
//bottomCase();
